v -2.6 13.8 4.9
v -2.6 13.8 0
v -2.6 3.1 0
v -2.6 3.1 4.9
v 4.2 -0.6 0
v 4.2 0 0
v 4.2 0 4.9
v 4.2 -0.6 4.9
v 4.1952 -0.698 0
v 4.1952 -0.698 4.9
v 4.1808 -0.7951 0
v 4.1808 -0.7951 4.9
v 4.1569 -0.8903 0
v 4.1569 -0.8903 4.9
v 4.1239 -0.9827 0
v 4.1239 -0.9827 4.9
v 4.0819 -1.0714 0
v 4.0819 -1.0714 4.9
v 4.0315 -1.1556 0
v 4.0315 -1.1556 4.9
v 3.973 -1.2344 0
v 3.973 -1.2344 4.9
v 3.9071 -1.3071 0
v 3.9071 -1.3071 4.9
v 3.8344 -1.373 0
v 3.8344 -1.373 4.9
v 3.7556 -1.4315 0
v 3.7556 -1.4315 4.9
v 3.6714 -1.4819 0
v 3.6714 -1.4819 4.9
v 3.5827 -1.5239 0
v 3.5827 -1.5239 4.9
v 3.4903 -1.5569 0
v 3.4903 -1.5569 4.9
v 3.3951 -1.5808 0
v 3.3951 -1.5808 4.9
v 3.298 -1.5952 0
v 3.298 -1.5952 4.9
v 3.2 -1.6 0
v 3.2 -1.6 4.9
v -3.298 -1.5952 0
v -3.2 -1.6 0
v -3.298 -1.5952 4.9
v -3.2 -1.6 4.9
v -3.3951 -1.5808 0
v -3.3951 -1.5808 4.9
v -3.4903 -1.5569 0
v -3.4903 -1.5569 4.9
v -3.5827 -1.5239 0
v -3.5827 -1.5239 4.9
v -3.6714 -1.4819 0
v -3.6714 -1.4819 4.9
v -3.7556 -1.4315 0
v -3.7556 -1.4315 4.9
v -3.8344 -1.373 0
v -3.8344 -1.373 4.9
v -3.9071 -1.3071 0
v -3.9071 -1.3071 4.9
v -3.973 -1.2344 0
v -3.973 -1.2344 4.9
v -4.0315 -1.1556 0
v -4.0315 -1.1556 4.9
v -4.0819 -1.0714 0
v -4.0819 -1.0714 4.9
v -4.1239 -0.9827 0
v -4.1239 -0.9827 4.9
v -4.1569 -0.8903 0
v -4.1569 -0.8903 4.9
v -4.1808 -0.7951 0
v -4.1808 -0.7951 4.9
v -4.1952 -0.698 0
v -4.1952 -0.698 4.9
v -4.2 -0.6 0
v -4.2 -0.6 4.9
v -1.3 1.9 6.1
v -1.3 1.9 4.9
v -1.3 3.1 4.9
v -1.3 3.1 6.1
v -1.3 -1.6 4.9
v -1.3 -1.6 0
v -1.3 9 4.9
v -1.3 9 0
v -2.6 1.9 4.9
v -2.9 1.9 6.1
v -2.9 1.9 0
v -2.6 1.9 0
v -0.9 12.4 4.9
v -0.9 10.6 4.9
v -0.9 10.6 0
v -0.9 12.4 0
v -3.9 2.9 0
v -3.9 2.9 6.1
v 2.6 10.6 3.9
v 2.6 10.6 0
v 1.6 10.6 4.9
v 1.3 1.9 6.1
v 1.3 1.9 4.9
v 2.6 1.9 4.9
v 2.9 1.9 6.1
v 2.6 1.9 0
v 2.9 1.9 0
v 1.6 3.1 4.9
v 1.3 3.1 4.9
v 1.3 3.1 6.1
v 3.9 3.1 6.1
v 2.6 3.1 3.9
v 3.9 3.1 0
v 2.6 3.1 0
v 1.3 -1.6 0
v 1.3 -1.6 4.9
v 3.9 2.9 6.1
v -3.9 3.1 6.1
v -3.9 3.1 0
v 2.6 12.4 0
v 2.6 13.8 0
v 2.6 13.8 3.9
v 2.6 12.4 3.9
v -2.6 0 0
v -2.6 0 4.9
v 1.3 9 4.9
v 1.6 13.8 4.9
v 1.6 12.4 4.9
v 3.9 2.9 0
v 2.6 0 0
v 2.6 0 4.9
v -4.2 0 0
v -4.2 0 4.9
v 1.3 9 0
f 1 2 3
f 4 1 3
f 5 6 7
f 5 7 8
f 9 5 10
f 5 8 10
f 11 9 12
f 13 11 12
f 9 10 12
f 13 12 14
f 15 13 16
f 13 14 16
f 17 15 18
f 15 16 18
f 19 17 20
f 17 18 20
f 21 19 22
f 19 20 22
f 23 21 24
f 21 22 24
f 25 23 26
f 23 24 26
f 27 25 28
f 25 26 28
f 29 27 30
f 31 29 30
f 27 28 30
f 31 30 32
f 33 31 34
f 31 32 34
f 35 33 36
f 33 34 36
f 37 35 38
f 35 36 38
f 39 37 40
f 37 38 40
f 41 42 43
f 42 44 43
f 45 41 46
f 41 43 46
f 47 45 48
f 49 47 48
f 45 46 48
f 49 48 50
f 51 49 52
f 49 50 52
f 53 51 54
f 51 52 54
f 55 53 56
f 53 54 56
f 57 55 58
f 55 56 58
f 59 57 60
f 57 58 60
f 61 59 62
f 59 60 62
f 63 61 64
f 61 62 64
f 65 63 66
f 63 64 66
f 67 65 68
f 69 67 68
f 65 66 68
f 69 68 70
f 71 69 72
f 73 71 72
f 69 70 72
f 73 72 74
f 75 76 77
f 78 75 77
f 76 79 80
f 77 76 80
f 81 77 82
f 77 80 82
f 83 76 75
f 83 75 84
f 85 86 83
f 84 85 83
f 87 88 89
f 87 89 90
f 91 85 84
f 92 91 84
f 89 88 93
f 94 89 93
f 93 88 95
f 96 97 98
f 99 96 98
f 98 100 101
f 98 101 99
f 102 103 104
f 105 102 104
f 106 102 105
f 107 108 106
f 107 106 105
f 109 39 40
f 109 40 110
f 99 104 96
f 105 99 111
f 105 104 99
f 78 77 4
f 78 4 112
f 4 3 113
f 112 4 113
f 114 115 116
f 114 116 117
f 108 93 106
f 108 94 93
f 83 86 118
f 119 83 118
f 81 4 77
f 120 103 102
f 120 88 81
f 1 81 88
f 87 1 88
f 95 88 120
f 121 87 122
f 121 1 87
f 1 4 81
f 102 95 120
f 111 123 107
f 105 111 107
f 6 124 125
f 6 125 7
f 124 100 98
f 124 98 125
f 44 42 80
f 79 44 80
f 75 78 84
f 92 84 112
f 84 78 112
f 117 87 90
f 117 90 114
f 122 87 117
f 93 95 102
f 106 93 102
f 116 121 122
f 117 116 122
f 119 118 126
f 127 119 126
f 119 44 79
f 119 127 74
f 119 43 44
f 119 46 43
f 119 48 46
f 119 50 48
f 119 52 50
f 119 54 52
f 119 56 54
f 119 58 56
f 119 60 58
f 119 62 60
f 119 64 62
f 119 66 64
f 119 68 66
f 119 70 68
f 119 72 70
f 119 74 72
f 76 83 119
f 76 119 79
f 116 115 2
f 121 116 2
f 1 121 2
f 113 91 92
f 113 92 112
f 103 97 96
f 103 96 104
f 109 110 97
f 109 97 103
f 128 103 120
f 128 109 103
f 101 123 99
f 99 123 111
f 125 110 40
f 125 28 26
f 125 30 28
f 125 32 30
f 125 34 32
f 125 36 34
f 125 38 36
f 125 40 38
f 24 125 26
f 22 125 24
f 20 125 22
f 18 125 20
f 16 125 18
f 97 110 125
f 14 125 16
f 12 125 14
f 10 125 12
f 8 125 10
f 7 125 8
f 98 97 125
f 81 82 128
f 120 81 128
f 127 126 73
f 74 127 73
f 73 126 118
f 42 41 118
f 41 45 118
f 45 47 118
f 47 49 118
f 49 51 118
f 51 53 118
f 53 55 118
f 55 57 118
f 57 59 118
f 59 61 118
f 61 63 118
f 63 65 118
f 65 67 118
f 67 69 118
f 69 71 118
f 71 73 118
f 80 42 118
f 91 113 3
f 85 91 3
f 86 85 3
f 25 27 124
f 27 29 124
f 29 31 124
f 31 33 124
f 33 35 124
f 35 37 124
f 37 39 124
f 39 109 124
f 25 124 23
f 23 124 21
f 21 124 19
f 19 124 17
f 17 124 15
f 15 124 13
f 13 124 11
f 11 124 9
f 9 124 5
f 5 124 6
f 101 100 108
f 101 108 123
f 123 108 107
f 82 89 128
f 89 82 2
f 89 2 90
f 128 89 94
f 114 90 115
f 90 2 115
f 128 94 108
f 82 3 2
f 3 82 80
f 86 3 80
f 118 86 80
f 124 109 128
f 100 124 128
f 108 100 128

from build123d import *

# Parameters (mm, degrees)
PAD016_DEPTH    = 4.9
SKETCH032_W     = 2.6
SKETCH032_H     = 1.2
PAD017_DEPTH    = 6.1
SKETCH031_W     = 3.5
SKETCH031_H     = 1.8
POCKET013_DEPTH = 3.4
CHAMFER_SIZE    = 1
FILLET010_R     = 1
SKETCH040_W     = 3.5
SKETCH040_H     = 1.8
POCKET016_DEPTH = 4.901


with BuildPart() as part:
    # Sketch030 → Pad016 (new body)
    with BuildSketch(Plane.XY):
        Polygon((0, 9), (0, 13.8), (2.6, 13.8), (2.6, 0), (4.2, 0), (4.2, -1.6), (1.3, -1.6), (1.3, 9), align=None)
    pad016 = extrude(amount=PAD016_DEPTH)

    # Mirrored006: Pad016 across Sketch030 V_Axis
    add(pad016.mirror(Plane(origin=(0, 0, 0), x_dir=(0, 0, 1), z_dir=(1, 0, 0))))

    # Sketch032 → Pad017 (join)
    with BuildSketch(Plane.XY):
        with Locations((2.6, 2.5)):
            Rectangle(SKETCH032_W, SKETCH032_H)
    pad017 = extrude(amount=PAD017_DEPTH)

    # Mirrored007: Pad017 across Sketch032 V_Axis
    add(pad017.mirror(Plane(origin=(0, 0, 0), x_dir=(0, 0, 1), z_dir=(1, 0, 0))))

    # Sketch031 (on Face5 of Mirrored007) → Pocket013 (cut)
    with BuildSketch(Plane.XY.offset(4.9)):
        with Locations((0.85, 11.5)):
            Rectangle(SKETCH031_W, SKETCH031_H)
    extrude(amount=-POCKET013_DEPTH, mode=Mode.SUBTRACT)

    # Chamfer
    chamfer_edges = [part.edges().sort_by_distance(p)[0] for p in [
        (-3.9, 1.9, 3.05),
        (3.9, 1.9, 3.05),
        (2.6, 6.85, 4.9),
        (2.6, 13.1, 4.9),
    ]]
    chamfer(chamfer_edges, length=CHAMFER_SIZE)

    # Fillet010
    fillet010_edges = [part.edges().sort_by_distance(p)[0] for p in [
        (4.2, -1.6, 2.45),
        (-4.2, -1.6, 2.45),
    ]]
    fillet(fillet010_edges, radius=FILLET010_R)


with BuildPart() as part_1:
    # Body004 placement: moved
    add(part.part.moved(Location((-19.5, 0, 3.95))))


with BuildPart() as part_2:
    # Clone placement: moved
    add(part_1.part.moved(Location((19.5, 0, -3.95))))

    # Sketch040 (on Face31 of Fillet010) → Pocket016 (cut, through all)
    with BuildSketch(Plane.XY.offset(4.9)):
        with Locations((0.85, 11.5)):
            Rectangle(SKETCH040_W, SKETCH040_H)
    extrude(amount=-POCKET016_DEPTH, mode=Mode.SUBTRACT)


solid = part_2.part
